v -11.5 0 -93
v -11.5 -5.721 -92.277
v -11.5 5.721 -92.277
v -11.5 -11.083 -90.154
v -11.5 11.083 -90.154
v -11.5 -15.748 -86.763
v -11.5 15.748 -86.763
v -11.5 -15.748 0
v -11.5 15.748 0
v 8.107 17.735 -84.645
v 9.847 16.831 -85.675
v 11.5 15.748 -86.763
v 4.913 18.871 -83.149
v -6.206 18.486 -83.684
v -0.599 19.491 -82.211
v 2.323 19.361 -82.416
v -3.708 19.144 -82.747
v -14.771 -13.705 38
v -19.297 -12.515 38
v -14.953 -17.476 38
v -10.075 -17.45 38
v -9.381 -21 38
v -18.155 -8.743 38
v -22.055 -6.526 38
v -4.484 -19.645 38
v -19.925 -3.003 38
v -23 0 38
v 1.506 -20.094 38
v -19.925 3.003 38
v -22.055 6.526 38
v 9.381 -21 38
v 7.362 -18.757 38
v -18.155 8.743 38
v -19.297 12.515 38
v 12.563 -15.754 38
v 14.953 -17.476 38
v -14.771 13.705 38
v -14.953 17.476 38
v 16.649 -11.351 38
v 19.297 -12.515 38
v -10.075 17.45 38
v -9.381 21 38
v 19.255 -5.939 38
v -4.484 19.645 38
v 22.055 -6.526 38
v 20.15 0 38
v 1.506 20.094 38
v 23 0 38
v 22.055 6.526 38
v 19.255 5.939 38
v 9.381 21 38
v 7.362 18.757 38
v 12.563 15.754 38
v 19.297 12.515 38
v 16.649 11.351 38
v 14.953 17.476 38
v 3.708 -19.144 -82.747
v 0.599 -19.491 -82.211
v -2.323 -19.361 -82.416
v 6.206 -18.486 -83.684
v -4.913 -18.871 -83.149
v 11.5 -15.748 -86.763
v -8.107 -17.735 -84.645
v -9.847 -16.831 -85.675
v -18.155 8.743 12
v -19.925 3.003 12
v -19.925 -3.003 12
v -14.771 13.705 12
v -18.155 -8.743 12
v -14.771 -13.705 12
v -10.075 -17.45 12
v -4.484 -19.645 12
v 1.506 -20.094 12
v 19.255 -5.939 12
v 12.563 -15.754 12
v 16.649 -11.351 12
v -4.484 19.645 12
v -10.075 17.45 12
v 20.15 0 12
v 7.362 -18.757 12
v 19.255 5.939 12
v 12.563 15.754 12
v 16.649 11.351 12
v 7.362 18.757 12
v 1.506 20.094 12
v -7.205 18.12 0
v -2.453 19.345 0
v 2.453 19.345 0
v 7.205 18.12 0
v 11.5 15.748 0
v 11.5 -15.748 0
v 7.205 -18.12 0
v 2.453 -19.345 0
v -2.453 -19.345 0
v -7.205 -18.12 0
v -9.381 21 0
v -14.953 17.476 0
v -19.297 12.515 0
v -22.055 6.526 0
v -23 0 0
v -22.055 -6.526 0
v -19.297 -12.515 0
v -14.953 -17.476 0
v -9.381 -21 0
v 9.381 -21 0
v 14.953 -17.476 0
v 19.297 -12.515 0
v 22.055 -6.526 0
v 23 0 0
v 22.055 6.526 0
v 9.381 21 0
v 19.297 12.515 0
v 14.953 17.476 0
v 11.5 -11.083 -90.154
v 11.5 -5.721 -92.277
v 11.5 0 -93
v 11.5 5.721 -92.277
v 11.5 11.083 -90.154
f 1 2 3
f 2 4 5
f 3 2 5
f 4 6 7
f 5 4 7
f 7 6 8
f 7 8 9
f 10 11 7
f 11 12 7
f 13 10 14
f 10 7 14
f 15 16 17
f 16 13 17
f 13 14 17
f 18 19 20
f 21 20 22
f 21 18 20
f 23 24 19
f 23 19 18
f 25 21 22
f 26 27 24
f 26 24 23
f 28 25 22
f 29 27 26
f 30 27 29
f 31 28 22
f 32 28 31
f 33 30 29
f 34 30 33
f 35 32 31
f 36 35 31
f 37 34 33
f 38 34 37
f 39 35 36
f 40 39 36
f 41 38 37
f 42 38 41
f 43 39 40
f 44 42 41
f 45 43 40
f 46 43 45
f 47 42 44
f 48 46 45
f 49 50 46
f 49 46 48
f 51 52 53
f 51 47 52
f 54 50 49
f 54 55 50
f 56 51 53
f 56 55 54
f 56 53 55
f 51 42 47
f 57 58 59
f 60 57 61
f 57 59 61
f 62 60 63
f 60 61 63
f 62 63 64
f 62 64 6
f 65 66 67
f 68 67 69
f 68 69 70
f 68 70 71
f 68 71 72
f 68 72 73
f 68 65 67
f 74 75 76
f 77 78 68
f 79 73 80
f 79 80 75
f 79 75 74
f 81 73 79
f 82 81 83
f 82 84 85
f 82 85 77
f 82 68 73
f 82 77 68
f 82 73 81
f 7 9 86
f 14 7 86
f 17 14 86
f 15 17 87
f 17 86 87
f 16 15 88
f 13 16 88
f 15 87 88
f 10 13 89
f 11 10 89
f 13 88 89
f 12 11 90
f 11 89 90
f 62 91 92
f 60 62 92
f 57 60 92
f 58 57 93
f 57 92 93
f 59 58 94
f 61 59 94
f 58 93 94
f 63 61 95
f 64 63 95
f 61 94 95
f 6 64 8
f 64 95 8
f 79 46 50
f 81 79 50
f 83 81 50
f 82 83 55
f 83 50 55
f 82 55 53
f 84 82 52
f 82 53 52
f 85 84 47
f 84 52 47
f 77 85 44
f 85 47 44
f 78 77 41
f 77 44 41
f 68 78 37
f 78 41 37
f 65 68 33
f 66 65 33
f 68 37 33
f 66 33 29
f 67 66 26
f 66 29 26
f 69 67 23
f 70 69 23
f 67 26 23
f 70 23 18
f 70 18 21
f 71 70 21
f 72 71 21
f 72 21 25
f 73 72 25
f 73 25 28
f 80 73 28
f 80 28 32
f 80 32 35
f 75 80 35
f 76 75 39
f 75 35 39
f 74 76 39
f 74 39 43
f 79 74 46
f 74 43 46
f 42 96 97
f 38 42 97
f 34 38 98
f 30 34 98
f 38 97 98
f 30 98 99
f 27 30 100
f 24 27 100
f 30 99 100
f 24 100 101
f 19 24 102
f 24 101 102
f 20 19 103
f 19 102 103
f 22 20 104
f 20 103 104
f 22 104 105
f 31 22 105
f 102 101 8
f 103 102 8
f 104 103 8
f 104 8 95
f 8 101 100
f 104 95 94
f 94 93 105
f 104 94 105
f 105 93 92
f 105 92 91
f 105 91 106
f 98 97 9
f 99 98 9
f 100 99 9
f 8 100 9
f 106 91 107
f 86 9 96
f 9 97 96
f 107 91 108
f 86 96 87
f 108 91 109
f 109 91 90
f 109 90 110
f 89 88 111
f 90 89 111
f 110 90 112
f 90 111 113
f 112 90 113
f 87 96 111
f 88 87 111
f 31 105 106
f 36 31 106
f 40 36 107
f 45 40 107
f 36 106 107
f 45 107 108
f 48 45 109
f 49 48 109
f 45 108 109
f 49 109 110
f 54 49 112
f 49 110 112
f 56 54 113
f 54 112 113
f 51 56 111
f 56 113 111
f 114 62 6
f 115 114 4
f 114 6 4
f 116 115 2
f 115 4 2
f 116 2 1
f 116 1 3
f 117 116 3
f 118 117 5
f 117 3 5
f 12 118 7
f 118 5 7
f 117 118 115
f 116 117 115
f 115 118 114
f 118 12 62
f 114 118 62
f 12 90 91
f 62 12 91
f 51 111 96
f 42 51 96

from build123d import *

# Parameters (mm, degrees)
F1_DEPTH = 38
F2_R     = 20.15
F3_DEPTH = 26
F5_DEPTH = 93
F7_DEPTH = 34.501


with BuildPart() as f1:
    # F0 (on Top) → F1 (new body)
    with BuildSketch(Plane.XY):
        with BuildLine():
            Line((9.380832, 21), (-9.380832, 21))
            ThreePointArc((-9.380832, 21), (-23, 0), (-9.380832, -21))
            Line((-9.380832, -21), (9.380832, -21))
            ThreePointArc((9.380832, -21), (23, 0), (9.380832, 21))
        make_face()
    extrude(amount=F1_DEPTH)

    # F2 (on face) → F3 (cut)
    with BuildSketch(Plane.XY.offset(38)):
        Circle(F2_R)
    extrude(amount=-F3_DEPTH, mode=Mode.SUBTRACT)

    # F4 (on face) → F5 (join)
    with BuildSketch(Plane(origin=(0, 0, 0), x_dir=(1, 0, 0), z_dir=(0, 0, -1))):
        with BuildLine():
            Line((-11.5, 15.748016), (-11.5, -15.748016))
            ThreePointArc((-11.5, -15.748016), (0, -19.5), (11.5, -15.748016))
            Line((11.5, -15.748016), (11.5, 15.748016))
            ThreePointArc((11.5, 15.748016), (0, 19.5), (-11.5, 15.748016))
        make_face()
    extrude(amount=F5_DEPTH)

    # F6 (on face) → F7 (cut, through all)
    with BuildSketch(Plane(origin=(-11.5, 0, 0), x_dir=(0, -1, 0), z_dir=(-1, 0, 0))):
        with BuildLine():
            Line((15.748016, -93), (15.748016, -86.763055))
            ThreePointArc((15.748016, -86.763055), (8.469054, -91.383992), (0, -93))
            Line((0, -93), (15.748016, -93))
        make_face()
        with BuildLine():
            Line((-15.748016, -93), (0, -93))
            ThreePointArc((0, -93), (-8.469054, -91.383992), (-15.748016, -86.763055))
            Line((-15.748016, -86.763055), (-15.748016, -93))
        make_face()
        with BuildLine():
            Line((22.997589, -108.386131), (22.997589, -70.332999))
            ThreePointArc((22.997589, -70.332999), (21.042627, -79.284818), (15.748016, -86.763055))
            Line((15.748016, -86.763055), (15.748016, -93))
            Line((15.748016, -93), (0, -93))
            Line((0, -93), (-15.748016, -93))
            Line((-15.748016, -93), (-15.748016, -86.763055))
            ThreePointArc((-15.748016, -86.763055), (-21.30932, -78.655224), (-22.976737, -68.96581))
            Line((-22.976737, -68.96581), (-35.855297, -106.006794))
            Line((-35.855297, -106.006794), (22.997589, -108.386131))
        make_face()
    extrude(amount=-F7_DEPTH, mode=Mode.SUBTRACT)


solid = f1.part
